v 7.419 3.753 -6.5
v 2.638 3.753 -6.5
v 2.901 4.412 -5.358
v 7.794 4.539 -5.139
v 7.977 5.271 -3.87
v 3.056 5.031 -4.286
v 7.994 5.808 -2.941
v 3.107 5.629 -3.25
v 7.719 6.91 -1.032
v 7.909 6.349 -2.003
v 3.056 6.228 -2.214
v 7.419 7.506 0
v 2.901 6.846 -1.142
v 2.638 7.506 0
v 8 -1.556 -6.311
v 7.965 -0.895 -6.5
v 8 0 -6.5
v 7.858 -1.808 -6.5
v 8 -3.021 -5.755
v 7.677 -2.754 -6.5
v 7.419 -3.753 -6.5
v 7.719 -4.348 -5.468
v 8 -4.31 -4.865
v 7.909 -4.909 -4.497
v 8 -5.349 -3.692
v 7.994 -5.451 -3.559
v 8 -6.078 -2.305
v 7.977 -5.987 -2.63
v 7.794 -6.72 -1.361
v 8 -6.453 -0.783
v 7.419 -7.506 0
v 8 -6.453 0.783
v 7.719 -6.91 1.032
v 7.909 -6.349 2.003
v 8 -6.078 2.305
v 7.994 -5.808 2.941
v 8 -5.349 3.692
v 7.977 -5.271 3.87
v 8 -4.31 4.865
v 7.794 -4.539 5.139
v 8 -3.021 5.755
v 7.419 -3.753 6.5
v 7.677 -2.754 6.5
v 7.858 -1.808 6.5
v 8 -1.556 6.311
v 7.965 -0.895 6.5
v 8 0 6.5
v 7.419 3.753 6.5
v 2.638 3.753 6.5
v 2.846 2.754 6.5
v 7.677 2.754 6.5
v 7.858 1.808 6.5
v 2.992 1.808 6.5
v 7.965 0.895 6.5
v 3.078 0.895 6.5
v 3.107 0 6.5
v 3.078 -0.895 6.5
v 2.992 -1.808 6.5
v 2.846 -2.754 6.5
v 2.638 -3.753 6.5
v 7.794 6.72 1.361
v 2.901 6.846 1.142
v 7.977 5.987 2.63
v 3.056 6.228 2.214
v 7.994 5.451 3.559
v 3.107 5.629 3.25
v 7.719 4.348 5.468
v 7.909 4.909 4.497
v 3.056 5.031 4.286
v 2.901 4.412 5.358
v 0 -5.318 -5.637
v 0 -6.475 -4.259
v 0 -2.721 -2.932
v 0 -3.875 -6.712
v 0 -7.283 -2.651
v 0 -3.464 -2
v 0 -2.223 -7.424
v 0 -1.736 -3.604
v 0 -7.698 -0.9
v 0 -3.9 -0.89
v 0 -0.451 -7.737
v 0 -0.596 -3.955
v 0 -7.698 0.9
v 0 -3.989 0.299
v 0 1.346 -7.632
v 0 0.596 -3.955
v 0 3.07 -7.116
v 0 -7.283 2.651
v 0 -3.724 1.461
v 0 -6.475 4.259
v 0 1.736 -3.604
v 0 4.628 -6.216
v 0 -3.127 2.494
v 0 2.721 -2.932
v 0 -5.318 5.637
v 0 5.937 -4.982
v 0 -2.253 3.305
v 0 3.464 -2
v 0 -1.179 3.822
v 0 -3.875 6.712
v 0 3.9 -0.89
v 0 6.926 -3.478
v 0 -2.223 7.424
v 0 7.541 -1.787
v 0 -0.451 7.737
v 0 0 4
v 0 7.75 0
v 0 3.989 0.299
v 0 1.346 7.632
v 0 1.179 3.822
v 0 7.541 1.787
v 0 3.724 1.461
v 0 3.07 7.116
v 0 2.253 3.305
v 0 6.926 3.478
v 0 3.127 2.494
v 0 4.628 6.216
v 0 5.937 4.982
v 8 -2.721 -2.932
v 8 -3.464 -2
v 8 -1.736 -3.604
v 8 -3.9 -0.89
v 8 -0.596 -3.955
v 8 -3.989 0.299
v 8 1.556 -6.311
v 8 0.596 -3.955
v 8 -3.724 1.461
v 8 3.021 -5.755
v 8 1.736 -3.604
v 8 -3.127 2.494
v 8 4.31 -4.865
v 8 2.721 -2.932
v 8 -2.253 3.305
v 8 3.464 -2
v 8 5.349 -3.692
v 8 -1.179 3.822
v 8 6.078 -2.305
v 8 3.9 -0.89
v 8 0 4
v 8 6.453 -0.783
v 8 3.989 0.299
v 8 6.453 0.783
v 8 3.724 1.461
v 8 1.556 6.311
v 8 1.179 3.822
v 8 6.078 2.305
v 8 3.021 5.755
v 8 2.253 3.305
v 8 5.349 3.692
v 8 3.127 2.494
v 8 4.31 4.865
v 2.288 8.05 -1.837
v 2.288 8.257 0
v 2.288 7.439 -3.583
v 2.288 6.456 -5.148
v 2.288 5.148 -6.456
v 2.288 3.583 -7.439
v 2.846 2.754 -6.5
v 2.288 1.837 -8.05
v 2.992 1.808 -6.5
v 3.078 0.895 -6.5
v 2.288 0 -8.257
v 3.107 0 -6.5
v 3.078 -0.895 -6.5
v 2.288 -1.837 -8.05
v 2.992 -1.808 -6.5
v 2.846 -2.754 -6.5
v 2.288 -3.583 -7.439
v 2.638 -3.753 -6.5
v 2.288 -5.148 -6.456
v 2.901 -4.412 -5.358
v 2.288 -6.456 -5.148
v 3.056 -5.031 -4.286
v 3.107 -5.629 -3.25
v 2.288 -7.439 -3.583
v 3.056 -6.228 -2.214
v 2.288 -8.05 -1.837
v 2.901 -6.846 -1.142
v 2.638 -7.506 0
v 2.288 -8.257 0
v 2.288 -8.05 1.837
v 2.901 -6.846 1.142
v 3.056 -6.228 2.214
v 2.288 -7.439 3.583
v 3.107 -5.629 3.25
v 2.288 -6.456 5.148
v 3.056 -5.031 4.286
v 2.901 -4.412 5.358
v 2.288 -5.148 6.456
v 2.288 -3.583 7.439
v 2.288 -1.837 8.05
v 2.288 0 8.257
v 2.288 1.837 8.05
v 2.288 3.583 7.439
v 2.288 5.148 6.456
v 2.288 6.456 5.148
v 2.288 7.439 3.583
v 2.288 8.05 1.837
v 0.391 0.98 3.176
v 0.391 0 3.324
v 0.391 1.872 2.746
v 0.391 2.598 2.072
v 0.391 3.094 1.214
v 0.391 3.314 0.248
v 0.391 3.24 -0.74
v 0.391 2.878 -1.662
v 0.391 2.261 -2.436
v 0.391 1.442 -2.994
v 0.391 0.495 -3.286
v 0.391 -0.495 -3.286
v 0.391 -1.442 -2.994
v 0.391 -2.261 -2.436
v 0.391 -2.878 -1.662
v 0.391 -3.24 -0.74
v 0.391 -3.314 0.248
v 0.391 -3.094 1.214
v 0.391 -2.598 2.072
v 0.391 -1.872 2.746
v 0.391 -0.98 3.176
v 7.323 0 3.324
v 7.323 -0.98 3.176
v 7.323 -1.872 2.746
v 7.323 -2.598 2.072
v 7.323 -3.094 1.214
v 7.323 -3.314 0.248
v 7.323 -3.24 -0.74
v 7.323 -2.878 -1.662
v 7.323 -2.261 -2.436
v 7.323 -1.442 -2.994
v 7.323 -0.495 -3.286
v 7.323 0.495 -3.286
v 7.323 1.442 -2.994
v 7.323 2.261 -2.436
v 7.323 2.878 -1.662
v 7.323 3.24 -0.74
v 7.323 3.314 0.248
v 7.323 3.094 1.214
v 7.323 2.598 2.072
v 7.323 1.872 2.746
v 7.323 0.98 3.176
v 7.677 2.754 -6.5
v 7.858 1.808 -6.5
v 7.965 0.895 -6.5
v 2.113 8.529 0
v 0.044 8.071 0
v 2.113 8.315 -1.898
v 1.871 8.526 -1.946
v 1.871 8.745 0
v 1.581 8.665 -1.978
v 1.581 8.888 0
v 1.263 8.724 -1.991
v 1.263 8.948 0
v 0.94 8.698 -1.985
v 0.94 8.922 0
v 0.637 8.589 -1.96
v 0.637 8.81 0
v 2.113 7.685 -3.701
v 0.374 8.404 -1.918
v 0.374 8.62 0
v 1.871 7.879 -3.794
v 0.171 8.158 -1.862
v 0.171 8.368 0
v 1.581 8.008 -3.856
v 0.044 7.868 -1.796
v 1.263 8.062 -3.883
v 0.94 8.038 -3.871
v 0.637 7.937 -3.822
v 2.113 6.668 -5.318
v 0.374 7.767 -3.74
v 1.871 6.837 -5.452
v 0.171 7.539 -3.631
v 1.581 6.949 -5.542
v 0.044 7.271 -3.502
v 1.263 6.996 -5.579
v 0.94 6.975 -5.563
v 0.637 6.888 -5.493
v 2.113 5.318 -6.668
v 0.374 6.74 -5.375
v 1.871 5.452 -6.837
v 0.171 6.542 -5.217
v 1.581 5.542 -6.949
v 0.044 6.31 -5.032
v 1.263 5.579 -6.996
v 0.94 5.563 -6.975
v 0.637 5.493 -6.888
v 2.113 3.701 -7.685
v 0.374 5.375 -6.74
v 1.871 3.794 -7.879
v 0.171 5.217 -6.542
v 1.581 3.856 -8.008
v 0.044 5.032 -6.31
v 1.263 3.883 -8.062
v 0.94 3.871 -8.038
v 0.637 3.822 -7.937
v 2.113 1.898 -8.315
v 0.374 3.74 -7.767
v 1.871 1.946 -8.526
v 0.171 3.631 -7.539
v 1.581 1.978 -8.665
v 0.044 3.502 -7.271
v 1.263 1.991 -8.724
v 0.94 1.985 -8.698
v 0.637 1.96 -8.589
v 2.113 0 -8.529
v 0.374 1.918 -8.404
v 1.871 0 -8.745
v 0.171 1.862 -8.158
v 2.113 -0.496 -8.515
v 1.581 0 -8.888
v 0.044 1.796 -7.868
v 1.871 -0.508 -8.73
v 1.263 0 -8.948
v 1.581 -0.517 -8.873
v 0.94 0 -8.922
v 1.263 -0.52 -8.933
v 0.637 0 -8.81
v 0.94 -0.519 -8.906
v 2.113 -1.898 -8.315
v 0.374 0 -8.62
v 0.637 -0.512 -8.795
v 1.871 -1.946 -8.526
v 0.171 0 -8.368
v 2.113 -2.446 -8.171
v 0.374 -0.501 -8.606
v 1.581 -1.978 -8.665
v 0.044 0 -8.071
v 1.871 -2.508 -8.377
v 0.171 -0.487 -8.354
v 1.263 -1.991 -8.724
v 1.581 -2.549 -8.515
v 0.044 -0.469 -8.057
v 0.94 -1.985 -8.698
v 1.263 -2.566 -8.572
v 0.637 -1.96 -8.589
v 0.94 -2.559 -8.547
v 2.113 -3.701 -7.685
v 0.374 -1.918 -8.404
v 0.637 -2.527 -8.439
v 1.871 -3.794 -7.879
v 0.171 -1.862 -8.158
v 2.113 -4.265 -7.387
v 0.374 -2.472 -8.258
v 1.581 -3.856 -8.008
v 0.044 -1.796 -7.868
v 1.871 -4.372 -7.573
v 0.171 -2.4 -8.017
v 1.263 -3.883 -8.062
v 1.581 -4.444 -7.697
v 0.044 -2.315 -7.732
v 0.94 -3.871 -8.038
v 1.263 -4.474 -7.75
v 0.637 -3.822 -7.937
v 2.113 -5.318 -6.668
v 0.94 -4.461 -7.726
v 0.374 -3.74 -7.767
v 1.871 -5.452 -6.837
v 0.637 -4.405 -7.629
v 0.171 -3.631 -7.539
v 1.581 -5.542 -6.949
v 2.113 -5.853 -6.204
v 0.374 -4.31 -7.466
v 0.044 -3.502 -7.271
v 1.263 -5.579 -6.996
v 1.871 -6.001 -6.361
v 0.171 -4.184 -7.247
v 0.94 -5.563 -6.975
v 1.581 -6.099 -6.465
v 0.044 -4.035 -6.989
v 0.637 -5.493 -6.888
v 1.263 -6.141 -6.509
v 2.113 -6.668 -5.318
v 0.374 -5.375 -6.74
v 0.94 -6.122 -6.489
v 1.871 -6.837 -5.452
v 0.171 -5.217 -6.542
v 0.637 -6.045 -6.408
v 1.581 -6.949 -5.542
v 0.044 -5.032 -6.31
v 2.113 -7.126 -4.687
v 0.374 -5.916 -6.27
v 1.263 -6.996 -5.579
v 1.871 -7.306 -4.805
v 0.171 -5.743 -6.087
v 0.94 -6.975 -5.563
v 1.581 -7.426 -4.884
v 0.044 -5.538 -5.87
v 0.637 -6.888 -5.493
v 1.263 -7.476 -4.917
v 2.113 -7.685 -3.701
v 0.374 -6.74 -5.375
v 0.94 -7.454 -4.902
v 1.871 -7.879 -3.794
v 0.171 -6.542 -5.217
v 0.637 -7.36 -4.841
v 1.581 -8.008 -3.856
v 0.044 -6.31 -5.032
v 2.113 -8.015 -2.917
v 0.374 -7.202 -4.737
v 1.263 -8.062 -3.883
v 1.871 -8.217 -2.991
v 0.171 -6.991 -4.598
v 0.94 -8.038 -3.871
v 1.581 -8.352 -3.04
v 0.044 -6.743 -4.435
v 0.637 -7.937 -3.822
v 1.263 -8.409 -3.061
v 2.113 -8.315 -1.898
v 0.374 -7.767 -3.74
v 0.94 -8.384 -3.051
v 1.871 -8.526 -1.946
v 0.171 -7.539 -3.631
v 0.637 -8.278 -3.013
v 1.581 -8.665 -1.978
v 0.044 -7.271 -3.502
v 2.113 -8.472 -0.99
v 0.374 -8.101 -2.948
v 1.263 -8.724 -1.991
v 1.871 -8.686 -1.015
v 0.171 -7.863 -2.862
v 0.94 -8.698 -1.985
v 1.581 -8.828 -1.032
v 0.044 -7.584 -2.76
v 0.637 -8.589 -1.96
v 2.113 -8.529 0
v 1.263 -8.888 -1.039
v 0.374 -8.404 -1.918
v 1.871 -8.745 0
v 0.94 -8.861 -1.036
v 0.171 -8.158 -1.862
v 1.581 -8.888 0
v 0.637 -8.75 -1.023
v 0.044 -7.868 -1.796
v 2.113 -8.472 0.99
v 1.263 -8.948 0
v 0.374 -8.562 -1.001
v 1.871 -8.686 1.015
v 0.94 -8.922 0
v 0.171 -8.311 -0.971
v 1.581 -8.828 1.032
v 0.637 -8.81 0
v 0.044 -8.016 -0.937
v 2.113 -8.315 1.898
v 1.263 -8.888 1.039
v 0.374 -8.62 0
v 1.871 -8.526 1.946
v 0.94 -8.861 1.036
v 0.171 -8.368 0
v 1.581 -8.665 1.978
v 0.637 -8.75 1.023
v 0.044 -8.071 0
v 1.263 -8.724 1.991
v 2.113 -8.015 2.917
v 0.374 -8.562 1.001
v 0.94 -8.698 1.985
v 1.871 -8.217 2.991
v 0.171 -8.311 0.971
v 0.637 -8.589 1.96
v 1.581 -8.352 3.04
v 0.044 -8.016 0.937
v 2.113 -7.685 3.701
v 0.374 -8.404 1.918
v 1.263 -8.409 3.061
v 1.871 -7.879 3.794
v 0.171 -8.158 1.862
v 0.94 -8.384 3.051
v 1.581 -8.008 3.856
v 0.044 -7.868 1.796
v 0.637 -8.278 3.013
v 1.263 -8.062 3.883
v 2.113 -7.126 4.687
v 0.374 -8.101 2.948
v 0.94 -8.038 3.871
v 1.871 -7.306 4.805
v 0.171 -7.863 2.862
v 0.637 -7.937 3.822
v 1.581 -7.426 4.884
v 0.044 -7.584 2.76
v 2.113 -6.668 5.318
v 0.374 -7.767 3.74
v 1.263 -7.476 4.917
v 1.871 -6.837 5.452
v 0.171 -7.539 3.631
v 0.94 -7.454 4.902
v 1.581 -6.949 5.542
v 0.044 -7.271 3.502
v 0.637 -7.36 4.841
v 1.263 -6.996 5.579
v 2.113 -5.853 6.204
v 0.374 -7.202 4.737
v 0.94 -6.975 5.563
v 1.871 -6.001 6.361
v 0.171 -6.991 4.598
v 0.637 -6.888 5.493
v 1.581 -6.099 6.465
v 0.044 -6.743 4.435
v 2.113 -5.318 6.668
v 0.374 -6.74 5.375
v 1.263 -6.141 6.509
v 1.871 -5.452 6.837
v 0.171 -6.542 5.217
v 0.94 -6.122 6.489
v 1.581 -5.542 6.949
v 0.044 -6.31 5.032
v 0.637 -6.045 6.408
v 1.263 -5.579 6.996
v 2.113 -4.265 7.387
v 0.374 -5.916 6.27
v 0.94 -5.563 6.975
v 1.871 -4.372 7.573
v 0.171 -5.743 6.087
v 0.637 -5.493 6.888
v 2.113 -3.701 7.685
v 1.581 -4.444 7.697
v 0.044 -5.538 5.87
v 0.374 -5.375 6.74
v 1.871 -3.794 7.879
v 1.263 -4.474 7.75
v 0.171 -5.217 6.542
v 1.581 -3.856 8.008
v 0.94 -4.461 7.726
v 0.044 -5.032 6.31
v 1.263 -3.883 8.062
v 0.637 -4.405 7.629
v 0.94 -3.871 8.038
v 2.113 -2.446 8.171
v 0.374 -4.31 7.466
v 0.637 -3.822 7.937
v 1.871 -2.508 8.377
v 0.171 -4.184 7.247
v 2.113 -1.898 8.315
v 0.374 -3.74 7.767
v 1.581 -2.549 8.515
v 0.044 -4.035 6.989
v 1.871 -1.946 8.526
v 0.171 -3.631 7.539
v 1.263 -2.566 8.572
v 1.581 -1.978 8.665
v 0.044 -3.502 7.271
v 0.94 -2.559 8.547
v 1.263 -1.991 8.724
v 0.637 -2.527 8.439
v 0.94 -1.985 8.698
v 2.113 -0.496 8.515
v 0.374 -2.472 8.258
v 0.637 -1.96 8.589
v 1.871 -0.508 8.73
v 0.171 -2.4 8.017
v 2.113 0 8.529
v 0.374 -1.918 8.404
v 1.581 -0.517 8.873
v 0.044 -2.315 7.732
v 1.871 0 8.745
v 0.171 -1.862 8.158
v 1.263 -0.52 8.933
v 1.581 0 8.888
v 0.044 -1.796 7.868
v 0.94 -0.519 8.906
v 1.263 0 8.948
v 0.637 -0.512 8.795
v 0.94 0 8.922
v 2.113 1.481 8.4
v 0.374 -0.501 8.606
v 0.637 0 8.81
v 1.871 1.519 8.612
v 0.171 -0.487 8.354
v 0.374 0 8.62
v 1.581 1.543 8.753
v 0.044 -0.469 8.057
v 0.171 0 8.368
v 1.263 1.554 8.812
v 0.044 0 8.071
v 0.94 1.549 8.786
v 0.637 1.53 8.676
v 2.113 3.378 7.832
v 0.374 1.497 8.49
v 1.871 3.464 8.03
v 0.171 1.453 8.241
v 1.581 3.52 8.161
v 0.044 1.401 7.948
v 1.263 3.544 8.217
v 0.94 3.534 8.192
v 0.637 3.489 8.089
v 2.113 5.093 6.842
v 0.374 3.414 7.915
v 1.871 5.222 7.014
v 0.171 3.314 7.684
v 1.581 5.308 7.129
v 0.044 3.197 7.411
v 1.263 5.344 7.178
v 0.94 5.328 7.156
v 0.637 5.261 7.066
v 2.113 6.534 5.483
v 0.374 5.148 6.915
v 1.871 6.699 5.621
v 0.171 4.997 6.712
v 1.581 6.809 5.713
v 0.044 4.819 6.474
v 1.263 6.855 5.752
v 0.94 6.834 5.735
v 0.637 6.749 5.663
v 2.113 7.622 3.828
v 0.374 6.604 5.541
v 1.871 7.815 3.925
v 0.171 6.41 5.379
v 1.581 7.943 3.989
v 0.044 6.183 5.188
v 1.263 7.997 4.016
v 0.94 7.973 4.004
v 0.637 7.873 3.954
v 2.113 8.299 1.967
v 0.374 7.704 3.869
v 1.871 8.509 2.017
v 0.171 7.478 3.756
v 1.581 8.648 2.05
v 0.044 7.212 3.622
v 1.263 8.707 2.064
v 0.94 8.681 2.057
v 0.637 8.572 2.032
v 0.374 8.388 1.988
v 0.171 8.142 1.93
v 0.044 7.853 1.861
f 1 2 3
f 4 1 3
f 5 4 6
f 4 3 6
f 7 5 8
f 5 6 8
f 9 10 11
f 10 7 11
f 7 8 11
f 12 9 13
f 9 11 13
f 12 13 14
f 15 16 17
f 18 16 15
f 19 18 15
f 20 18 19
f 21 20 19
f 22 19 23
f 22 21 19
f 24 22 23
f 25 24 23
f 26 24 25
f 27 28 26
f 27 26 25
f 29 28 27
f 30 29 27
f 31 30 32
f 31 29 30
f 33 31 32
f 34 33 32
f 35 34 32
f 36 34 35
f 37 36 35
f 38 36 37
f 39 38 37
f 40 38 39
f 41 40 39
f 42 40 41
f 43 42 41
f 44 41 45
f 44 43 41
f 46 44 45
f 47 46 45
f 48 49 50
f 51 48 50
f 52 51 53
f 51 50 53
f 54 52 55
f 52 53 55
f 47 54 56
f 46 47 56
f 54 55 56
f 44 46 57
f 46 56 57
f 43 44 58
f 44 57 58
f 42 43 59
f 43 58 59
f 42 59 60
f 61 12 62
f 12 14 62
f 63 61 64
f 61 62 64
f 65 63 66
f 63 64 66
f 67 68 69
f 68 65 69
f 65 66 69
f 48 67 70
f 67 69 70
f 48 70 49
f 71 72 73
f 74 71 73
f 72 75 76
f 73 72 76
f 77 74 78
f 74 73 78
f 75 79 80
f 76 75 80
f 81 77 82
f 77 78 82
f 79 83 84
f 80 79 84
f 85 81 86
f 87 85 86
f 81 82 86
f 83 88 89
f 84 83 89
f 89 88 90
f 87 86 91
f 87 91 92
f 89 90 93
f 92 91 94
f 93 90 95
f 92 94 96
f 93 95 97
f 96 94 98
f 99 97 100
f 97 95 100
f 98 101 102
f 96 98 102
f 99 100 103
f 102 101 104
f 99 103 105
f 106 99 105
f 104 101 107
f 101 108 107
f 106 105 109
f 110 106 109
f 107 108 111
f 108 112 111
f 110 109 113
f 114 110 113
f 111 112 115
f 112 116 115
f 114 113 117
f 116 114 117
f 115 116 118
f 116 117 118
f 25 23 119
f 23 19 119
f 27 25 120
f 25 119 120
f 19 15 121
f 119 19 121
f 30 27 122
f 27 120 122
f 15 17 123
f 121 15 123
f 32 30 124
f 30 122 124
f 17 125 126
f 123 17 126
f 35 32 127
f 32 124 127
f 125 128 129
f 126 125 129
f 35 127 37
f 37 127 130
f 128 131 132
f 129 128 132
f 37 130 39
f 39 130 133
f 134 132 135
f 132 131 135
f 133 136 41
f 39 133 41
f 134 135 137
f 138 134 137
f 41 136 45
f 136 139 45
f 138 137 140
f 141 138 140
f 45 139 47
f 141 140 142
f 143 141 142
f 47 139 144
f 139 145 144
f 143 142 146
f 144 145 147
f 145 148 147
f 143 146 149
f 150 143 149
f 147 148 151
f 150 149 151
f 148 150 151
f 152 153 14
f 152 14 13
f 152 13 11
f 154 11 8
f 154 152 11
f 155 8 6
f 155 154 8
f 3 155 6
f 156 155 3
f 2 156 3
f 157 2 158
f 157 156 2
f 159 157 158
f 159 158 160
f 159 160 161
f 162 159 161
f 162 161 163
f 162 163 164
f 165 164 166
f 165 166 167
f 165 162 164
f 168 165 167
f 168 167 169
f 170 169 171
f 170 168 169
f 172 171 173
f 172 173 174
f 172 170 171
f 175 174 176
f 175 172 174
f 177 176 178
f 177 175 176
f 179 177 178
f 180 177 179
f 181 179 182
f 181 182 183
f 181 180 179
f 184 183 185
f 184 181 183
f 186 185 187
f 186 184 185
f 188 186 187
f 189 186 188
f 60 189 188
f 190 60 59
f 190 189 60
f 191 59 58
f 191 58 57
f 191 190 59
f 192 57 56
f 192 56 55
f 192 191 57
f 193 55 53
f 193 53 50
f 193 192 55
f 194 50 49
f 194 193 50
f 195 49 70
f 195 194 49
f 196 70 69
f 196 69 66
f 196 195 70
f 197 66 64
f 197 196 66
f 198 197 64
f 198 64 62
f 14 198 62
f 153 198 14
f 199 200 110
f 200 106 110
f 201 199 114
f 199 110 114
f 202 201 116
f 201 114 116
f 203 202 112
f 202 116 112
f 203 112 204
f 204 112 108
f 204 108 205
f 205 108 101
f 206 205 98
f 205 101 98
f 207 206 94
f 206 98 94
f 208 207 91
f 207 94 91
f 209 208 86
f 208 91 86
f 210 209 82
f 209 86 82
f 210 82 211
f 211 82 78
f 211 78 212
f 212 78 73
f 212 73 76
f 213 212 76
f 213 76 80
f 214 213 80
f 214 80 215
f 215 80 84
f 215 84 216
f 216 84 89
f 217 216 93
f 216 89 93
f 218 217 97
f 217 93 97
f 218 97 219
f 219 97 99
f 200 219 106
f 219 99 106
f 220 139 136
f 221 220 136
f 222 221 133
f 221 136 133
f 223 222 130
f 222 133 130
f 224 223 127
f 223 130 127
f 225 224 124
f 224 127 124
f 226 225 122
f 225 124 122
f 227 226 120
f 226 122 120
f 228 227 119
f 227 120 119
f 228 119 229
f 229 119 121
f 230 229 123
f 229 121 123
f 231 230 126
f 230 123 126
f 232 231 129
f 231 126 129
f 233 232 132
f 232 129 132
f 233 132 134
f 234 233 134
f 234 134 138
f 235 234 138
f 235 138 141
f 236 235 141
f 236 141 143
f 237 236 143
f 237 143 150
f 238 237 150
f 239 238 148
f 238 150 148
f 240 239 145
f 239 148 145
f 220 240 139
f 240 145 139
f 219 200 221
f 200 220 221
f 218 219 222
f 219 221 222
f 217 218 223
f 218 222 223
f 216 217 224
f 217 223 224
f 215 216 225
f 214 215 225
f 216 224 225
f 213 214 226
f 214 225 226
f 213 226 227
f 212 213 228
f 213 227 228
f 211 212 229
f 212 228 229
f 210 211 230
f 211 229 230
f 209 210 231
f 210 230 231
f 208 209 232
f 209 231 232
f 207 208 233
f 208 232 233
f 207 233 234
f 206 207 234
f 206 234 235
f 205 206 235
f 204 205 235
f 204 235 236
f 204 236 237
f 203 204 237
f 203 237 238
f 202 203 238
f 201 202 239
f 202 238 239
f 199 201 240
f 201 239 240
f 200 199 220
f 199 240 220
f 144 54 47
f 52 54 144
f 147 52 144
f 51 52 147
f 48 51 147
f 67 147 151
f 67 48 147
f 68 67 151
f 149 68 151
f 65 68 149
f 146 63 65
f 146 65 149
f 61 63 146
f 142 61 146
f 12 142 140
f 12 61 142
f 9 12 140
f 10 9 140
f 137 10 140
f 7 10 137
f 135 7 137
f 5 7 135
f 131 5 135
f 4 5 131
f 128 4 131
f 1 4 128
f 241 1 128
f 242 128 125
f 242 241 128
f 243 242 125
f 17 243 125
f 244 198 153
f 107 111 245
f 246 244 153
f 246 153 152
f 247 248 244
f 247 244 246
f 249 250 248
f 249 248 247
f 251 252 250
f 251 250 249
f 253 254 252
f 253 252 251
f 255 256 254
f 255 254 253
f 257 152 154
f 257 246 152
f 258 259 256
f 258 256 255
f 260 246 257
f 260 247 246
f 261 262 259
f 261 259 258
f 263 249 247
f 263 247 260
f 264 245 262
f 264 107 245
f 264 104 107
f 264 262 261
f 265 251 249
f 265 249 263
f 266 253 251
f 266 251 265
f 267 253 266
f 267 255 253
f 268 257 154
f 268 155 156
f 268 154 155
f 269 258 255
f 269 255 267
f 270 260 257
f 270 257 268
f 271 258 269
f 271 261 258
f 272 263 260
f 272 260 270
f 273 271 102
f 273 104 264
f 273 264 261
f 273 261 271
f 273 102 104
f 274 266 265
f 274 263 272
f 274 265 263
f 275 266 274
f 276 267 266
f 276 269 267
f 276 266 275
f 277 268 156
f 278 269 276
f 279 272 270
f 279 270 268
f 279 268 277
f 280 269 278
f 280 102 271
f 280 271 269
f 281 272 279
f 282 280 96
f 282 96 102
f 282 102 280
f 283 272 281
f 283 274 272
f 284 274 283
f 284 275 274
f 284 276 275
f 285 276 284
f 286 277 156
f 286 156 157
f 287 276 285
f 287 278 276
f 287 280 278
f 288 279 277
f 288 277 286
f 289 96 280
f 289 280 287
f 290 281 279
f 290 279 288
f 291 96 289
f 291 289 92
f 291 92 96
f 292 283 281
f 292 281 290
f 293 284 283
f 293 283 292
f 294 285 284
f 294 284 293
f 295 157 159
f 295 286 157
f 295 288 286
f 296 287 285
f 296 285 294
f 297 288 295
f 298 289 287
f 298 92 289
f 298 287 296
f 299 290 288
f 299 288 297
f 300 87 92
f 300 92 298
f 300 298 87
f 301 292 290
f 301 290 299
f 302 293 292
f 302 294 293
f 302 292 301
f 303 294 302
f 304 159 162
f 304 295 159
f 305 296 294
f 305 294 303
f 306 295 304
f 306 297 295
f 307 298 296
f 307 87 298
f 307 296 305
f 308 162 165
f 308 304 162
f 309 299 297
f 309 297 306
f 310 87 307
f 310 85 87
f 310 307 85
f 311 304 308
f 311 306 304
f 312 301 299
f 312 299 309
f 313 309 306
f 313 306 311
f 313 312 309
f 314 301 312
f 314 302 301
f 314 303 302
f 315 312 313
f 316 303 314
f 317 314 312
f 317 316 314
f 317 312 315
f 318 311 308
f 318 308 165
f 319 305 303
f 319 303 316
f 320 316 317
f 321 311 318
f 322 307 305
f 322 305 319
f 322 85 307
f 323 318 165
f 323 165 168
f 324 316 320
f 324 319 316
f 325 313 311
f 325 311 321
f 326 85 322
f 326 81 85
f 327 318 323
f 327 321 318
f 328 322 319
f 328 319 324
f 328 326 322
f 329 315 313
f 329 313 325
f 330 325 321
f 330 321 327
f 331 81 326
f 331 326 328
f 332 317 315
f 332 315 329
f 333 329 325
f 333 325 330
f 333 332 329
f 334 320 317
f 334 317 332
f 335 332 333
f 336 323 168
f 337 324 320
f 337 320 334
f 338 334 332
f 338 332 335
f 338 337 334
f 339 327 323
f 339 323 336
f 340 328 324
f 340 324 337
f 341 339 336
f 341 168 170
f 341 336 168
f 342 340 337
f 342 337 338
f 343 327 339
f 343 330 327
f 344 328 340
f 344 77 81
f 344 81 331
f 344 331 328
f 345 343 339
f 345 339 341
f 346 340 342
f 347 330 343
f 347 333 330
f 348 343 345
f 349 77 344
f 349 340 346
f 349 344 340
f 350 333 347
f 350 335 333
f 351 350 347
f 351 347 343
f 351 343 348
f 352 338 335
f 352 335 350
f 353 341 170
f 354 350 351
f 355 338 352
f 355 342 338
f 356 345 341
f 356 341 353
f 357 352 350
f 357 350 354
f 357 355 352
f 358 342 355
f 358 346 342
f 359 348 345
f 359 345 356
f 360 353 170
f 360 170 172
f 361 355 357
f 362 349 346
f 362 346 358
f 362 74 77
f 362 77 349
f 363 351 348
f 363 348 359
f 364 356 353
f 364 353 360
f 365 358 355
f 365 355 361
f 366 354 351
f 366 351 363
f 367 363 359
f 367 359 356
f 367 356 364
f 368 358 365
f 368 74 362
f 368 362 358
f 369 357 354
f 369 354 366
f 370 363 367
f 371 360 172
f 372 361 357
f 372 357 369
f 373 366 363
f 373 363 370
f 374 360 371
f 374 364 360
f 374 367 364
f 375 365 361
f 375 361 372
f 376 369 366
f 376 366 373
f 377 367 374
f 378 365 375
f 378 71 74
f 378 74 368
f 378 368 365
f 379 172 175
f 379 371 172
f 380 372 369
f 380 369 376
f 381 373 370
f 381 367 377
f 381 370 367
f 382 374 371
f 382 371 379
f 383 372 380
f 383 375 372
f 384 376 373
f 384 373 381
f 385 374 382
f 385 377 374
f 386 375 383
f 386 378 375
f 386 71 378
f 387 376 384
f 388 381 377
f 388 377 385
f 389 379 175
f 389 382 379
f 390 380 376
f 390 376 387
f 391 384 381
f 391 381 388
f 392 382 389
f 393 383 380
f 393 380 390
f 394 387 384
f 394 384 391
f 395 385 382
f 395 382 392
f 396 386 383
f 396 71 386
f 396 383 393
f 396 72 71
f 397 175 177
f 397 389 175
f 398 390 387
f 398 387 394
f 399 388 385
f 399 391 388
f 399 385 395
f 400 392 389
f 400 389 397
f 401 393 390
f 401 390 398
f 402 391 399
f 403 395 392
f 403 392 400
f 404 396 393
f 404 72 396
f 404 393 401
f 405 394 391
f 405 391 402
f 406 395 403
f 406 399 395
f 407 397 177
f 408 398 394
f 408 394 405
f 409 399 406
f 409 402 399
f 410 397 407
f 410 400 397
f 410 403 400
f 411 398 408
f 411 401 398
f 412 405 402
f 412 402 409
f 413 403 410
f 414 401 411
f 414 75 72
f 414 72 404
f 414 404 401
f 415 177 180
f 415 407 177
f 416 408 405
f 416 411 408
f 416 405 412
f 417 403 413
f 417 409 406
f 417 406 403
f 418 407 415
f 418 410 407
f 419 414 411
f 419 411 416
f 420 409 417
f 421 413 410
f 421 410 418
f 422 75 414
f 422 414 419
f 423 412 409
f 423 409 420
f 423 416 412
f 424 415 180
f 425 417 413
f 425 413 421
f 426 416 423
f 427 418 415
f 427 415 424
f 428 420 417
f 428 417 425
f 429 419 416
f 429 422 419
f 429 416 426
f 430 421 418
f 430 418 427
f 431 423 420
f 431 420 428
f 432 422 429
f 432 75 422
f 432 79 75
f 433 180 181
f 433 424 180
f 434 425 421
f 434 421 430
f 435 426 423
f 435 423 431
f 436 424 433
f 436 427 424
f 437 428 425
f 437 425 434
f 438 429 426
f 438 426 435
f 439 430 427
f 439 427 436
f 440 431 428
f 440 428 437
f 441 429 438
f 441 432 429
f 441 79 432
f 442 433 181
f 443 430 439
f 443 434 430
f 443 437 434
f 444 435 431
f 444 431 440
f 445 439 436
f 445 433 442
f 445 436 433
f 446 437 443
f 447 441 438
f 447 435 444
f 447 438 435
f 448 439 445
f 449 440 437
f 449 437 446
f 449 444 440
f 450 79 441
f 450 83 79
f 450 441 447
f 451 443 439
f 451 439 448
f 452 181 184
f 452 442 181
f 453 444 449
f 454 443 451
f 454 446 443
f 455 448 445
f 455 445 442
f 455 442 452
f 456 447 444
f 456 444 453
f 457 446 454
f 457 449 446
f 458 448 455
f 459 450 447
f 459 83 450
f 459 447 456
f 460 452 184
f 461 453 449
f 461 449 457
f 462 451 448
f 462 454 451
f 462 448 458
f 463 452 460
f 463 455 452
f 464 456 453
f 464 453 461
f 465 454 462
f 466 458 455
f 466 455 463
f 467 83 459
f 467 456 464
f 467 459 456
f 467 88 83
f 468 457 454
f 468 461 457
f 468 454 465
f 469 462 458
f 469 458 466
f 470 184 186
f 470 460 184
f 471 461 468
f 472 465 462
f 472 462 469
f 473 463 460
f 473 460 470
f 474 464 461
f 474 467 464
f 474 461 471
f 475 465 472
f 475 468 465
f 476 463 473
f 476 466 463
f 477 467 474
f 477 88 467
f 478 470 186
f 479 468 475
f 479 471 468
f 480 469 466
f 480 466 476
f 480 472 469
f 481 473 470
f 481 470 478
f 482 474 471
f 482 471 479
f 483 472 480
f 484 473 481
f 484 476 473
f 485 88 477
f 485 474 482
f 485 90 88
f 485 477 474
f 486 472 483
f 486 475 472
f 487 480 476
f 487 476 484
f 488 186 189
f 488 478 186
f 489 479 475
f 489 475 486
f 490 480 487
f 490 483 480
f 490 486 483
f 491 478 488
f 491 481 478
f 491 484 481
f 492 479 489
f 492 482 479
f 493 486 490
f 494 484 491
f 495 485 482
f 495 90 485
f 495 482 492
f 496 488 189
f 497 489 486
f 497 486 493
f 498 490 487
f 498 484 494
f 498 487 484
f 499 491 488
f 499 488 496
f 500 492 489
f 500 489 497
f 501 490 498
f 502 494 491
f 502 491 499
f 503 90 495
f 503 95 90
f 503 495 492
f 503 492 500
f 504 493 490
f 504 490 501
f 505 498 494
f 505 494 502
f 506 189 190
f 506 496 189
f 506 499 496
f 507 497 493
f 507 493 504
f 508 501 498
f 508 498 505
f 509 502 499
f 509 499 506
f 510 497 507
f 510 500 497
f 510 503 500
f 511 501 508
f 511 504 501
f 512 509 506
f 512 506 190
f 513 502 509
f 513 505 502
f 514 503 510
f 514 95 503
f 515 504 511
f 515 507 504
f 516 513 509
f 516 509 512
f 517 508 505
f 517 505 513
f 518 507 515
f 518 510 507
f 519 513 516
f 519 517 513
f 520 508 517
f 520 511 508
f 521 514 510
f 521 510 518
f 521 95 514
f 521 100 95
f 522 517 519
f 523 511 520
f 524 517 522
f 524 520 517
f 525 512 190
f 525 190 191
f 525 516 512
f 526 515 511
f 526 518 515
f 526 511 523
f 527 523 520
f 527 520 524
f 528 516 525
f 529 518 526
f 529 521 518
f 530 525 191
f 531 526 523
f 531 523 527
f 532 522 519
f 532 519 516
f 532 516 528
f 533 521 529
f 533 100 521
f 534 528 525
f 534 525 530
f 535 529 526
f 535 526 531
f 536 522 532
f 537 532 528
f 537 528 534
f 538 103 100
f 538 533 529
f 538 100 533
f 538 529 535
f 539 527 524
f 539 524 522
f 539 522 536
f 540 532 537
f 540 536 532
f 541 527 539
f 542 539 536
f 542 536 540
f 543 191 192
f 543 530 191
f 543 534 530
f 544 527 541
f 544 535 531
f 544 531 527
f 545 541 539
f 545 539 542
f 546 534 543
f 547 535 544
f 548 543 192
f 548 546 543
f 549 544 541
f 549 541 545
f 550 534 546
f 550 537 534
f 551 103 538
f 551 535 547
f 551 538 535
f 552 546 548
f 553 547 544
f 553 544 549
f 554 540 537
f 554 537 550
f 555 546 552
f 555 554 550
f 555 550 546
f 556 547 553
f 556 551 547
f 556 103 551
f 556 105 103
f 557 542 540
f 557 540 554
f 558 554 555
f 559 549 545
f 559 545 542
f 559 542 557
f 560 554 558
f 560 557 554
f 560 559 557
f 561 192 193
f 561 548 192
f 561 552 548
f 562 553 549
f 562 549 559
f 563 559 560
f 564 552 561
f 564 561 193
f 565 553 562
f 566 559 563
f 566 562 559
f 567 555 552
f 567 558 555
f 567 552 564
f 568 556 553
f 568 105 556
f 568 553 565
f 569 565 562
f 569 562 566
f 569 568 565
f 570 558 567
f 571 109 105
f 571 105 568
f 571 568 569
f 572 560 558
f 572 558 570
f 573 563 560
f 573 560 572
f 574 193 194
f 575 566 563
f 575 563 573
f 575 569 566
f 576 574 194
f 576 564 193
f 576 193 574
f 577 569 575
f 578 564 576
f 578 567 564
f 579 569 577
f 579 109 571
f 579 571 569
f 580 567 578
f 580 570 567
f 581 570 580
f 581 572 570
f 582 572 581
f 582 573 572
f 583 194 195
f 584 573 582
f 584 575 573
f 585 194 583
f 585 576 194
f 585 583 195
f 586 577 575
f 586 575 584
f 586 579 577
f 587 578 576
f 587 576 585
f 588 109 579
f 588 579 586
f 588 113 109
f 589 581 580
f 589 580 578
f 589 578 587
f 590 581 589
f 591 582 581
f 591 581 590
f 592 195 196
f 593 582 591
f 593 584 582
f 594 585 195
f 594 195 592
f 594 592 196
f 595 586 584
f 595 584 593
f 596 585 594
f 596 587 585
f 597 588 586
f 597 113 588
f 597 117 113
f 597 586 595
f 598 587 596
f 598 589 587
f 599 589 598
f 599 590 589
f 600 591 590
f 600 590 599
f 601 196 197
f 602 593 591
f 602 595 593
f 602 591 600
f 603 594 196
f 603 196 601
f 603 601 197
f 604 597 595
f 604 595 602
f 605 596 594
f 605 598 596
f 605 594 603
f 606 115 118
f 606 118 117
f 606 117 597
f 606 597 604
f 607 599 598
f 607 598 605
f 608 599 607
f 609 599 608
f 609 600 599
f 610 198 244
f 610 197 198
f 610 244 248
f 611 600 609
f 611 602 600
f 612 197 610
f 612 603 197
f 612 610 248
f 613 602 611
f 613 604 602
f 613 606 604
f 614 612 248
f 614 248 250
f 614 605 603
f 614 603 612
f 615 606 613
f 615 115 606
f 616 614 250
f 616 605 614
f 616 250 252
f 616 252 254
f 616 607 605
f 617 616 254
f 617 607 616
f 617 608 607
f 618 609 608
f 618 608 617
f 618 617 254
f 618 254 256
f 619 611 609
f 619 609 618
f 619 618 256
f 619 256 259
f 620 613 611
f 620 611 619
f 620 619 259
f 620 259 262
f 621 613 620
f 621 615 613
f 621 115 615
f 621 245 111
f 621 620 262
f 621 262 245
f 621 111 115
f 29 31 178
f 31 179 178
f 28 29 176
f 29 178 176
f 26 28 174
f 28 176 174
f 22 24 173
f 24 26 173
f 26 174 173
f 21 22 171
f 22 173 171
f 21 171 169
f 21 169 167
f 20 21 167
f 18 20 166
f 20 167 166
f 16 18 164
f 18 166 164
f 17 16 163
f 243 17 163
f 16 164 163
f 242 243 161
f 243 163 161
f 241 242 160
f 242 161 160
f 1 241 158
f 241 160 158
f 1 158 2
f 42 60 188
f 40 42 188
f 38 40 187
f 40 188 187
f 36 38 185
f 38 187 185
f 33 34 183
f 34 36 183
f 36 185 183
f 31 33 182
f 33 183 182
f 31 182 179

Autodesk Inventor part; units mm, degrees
ref_plane "YZ Plane" through (0, 0, 0) normal (1, 0, 0) x (0, 1, 0)
ref_plane "XZ Plane" through (0, 0, 0) normal (0, 1, 0) x (-1, 0, 0)
sketch "Sketch1" plane through (0, 0, 0) normal (0, 0, 1) x (1, 0, 0)
  line L0 (-1.8442, 0) -> (9.6407, 0) projected
  line L1 (3.1069, 6.5) -> (2.2876, 8.2571)
  line L2 (3.1069, 6.5) -> (8, 6.5) construction
  line L3 (8, 6.5) -> (8, 0) construction
  arc A0 (2.2876, 8.2571) -> (0, 7.75) centre (1.2, 7.75) ccw
  line L4 (3.1069, 6.5) -> (3.1069, 0)
  line L5 (0, -1.835) -> (0, 11.0102) projected
  point P0 (0, 0)
  dimension "d2" = 13
  dimension "d4" = 17.9
  dimension "d5" = 1.2
  dimension "d15" = 8
  dimension "d16" = 25
revolve "Ring" add sketch "Sketch1" angle 360 about axis through (-10, 0, 0) along (1, 0, 0)
sketch "Sketch2" plane through (0, 0, 0) normal (-1, 0, 0) x (0, 0, 1)
  circle A0 centre (0, 0) radius 4.9
  line L0 (-6.5, -3.7528) -> (-6.5, 3.7528)
  line L1 (-6.5, 3.7528) -> (0, 7.5056)
  line L2 (0, 7.5056) -> (6.5, 3.7528)
  line L3 (6.5, 3.7528) -> (6.5, -3.7528)
  line L4 (6.5, -3.7528) -> (0, -7.5056)
  line L5 (0, -7.5056) -> (-6.5, -3.7528)
  circle A1 centre (0, 0) radius 7.75 projected
  dimension "d6" = 15.0111
extrude "Body" add sketch "Sketch2" against normal blind 8 contours A0 | L0 L1 L2 L3 L4 L5
sketch "Sketch3" plane through (0, 0, 0) normal (0, 0, 1) x (1, 0, 0)
  line L0 (2.638, 7.5056) -> (8, 7.5056) projected
  line L1 (8, 3.7528) -> (8, 7.5056) projected
  line L2 (0, -7.75) -> (0, 7.75) projected
  line L3 (-1.6, 0) -> (9.6, 0) projected
  line L4 (7.4194, 7.5056) -> (8, 6.5)
  dimension "d10" = 30
  dimension "d11" = 13
revolve "Chamfer1" cut sketch "Sketch3" angle 360 about axis through (-10, 0, 0) along (1, 0, 0)
sketch "Sketch4" plane through (0, 0, 0) normal (-1, 0, 0) x (0, 0, 1)
  circle A0 centre (0, 0) radius 7.75 projected
hole "Thread" at (0, 0, 0) direction (1, 0, 0) diameter 6.647 end through all thread size "M8x1.25" class "6H" standard "ISO Metric profile"
chamfer "Chamfer2" distance 0.6766 angle 30 1 edges at (0, 0, -3.3235) measured on face at (0, 6.1914, -0.7518)
ref_plane "Work Plane1" through (26.5484, 0, 0) normal (0, 0, -1) x (-1, 0, 0)
chamfer "Chamfer3" distance 0.6766 angle 45 1 edges at (8, 0, -3.3235)
equation "\"d2\" = SW"
equation "\"d4\" = LADI"
equation "\"d5\" = PHH"
equation "\"d15\" = KOH"
equation "\"d16\" = KEWI"
equation "\"d6\" = 1.1547 * SW"
equation "\"d7\" = KOH"
equation "\"d10\" = ANG1"
equation "\"d11\" = SW0"
equation "\"d12\" = -0.5 * GD1 + 0.5 * NND"
equation "\"d46\" = -0.5 * GD1 + 0.5 * NND"
equation "\"d51\" = -0.5 * GD1 + 0.5 * NND"
equation "\"ANG1\" = 30deg"
equation "\"KEWI\" = 25deg"
equation "\"NND\" = 8"
equation "\"LADI\" = 17.9"
equation "\"SW\" = 13"
equation "\"PHH\" = 1.2"
equation "\"KOH\" = NND"
equation "\"SW0\" = 13"
equation "\"d1\" = LADI"
equation "\"d3\" = PHH"
equation "\"GUL\" = 0.541266 * PTC"
equation "\"RR\" = PHH"
equation "\"THREADDIA\" = 8"
equation "\"TOA\" = 30deg"
equation "\"PTC\" = 1.25"
equation "\"GAL\" = 0.541266 * PTC"
equation "\"E0\" = 1.155 * SW"
equation "\"GD1\" = 6.646835"
properties part number "ISO 4161 - M8(1)" material "Stainless Steel"
